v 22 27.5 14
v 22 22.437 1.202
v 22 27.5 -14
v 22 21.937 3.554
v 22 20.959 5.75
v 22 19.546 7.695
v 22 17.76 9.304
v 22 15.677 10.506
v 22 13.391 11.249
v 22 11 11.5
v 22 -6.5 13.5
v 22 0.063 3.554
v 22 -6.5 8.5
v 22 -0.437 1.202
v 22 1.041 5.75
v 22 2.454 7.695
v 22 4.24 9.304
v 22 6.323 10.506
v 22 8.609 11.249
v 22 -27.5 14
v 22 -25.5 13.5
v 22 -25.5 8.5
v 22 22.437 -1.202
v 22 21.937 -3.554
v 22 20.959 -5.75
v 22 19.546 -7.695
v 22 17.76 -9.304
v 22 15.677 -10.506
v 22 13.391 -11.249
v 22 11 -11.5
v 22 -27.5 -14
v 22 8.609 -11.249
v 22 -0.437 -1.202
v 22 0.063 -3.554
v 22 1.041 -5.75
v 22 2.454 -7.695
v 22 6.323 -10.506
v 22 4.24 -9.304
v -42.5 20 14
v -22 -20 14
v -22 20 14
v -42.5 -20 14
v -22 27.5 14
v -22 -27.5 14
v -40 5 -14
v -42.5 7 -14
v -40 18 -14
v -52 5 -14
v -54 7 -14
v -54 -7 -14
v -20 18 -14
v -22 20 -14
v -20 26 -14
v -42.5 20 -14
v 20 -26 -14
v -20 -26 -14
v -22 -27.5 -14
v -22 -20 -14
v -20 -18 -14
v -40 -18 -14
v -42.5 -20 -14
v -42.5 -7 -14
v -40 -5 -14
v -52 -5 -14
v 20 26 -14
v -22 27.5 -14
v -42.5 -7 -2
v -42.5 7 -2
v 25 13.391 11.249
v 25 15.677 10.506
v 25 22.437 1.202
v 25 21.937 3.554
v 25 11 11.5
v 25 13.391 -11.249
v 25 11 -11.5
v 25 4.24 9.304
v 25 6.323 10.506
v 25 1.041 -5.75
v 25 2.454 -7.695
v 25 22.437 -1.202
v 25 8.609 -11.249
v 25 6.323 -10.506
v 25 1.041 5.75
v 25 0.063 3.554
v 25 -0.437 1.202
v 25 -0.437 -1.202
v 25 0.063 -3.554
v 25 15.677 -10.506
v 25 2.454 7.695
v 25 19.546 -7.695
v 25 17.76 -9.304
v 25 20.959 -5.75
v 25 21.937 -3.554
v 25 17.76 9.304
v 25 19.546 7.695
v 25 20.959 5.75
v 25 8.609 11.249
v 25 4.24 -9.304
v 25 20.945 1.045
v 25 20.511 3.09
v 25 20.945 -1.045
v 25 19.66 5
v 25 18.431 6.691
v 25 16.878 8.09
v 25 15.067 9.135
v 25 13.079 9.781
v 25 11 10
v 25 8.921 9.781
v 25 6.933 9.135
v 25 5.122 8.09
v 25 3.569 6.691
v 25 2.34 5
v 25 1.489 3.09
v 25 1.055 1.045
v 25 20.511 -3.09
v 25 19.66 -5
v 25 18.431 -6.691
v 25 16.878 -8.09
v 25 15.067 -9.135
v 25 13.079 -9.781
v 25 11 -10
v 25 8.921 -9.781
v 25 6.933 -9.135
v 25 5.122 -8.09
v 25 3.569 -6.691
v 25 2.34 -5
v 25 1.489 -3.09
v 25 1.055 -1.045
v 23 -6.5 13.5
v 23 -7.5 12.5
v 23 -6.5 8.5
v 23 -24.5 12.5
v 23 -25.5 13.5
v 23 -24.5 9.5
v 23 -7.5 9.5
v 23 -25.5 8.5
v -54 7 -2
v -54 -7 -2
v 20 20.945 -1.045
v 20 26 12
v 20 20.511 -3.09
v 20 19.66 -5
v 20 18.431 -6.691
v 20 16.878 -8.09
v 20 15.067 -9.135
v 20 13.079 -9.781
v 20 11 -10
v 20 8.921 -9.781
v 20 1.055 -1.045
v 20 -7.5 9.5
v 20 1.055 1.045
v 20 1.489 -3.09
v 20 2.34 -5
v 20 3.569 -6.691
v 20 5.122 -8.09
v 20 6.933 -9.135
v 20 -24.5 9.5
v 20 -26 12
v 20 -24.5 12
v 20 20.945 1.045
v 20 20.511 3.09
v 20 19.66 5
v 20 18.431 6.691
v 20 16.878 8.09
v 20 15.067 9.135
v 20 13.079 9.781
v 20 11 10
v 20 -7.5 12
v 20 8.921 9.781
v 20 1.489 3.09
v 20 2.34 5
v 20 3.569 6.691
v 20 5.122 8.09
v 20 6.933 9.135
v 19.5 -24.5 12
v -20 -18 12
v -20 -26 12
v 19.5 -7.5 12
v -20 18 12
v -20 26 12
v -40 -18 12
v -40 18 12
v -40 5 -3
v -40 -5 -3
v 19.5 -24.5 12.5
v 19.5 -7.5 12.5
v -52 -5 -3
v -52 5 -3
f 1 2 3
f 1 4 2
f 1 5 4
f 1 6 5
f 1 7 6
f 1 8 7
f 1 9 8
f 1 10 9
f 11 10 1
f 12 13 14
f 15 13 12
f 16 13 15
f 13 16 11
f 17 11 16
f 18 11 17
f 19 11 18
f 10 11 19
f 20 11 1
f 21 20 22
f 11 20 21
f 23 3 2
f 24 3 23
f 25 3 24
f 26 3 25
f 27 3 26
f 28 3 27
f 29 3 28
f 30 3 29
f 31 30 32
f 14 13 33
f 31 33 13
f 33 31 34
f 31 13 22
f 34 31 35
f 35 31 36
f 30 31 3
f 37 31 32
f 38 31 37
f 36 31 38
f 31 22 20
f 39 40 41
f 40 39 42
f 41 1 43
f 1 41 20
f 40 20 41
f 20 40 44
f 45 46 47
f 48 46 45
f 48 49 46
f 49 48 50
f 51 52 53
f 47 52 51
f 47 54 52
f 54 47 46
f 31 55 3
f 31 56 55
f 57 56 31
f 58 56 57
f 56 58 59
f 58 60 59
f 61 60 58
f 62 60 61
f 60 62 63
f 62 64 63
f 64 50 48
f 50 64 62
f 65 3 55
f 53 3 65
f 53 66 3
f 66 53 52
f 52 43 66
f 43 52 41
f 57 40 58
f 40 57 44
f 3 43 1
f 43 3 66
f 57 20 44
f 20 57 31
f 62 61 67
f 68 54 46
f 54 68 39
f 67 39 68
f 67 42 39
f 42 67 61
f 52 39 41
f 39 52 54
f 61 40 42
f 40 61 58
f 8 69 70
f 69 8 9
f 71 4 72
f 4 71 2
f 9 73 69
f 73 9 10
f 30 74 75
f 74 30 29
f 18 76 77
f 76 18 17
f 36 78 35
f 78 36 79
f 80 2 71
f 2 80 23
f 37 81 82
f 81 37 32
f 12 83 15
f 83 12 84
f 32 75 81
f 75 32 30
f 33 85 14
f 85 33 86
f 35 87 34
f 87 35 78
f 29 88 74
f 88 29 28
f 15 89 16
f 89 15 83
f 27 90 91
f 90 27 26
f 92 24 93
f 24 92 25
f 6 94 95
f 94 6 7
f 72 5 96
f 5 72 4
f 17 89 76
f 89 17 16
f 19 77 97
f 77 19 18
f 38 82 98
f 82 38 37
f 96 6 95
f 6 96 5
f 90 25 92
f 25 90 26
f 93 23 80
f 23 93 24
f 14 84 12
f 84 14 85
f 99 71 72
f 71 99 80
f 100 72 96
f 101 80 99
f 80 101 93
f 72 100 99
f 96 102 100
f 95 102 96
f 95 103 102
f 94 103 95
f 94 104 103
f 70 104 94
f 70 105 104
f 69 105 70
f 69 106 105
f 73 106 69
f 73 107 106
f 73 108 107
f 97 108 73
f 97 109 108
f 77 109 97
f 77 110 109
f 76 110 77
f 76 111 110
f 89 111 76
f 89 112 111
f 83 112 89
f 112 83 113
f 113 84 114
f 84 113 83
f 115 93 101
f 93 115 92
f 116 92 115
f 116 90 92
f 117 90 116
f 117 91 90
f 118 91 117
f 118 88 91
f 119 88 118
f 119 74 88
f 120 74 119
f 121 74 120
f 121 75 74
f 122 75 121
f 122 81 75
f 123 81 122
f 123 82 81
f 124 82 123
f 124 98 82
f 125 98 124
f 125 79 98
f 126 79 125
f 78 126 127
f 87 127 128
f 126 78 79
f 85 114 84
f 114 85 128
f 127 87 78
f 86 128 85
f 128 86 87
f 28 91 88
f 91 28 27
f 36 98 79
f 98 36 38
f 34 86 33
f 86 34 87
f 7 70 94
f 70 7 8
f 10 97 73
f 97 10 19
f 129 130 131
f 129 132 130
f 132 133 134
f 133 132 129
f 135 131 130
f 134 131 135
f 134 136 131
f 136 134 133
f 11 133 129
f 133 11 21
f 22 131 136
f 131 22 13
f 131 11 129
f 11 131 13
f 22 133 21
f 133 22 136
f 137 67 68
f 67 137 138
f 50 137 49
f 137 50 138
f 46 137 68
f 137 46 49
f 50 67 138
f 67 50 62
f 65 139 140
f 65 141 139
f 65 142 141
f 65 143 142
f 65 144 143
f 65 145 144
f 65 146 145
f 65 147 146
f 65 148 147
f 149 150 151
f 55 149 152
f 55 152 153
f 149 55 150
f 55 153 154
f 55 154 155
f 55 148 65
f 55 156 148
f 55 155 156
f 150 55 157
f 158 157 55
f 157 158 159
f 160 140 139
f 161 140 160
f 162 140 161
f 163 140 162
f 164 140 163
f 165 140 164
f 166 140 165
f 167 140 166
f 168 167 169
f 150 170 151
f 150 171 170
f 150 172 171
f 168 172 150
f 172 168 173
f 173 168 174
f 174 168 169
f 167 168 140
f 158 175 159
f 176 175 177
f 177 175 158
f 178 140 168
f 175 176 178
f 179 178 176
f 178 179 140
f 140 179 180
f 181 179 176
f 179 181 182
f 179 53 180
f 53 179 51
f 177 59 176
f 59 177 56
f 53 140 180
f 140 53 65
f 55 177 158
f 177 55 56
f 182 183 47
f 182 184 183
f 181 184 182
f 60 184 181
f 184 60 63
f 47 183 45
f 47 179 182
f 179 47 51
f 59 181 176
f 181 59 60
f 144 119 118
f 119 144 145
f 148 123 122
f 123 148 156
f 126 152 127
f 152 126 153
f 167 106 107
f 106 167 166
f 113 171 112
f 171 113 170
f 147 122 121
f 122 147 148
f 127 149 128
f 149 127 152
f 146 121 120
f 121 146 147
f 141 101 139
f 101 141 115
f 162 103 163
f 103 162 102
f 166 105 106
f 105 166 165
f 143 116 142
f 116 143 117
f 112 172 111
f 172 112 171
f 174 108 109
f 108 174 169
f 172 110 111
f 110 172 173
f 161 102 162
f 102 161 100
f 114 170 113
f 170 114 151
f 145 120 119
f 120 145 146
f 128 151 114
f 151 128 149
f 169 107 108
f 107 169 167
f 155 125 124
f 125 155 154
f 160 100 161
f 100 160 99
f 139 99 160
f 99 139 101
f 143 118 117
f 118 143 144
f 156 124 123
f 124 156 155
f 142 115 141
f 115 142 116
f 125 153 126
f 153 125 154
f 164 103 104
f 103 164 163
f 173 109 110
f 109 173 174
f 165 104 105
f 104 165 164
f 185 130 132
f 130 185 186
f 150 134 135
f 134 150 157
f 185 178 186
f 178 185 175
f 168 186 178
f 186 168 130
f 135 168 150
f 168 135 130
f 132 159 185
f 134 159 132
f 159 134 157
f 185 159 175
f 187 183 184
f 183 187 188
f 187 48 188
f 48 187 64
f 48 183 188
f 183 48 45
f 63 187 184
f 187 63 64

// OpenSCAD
difference ([]){
    union(){
        cube([44,55,28], center=true);
        translate([-30,0,+0]) cube([25,40,28], center=true);
        translate([5,11,0]) rotate([0,90,0])  cylinder (h=40,d=23, center=true);   
        translate([+20,-16,+11]) cube([6,19,5], center=true);
        translate([-47,0,-8]) cube([14,14,12], center=true);
    }
    translate([+0,0,-4]) cube([40,52,32], center=true);
    translate([-29,0,-4]) cube([22,36,32], center=true);
    translate([10,11,0]) rotate([0,90,0])  cylinder (h=40,d=20, center=true);
    translate([+22,-16,+11]) cube([5,17,3], center=true);
    translate([-45,0,-9]) cube([14,10,12], center=true);
}
